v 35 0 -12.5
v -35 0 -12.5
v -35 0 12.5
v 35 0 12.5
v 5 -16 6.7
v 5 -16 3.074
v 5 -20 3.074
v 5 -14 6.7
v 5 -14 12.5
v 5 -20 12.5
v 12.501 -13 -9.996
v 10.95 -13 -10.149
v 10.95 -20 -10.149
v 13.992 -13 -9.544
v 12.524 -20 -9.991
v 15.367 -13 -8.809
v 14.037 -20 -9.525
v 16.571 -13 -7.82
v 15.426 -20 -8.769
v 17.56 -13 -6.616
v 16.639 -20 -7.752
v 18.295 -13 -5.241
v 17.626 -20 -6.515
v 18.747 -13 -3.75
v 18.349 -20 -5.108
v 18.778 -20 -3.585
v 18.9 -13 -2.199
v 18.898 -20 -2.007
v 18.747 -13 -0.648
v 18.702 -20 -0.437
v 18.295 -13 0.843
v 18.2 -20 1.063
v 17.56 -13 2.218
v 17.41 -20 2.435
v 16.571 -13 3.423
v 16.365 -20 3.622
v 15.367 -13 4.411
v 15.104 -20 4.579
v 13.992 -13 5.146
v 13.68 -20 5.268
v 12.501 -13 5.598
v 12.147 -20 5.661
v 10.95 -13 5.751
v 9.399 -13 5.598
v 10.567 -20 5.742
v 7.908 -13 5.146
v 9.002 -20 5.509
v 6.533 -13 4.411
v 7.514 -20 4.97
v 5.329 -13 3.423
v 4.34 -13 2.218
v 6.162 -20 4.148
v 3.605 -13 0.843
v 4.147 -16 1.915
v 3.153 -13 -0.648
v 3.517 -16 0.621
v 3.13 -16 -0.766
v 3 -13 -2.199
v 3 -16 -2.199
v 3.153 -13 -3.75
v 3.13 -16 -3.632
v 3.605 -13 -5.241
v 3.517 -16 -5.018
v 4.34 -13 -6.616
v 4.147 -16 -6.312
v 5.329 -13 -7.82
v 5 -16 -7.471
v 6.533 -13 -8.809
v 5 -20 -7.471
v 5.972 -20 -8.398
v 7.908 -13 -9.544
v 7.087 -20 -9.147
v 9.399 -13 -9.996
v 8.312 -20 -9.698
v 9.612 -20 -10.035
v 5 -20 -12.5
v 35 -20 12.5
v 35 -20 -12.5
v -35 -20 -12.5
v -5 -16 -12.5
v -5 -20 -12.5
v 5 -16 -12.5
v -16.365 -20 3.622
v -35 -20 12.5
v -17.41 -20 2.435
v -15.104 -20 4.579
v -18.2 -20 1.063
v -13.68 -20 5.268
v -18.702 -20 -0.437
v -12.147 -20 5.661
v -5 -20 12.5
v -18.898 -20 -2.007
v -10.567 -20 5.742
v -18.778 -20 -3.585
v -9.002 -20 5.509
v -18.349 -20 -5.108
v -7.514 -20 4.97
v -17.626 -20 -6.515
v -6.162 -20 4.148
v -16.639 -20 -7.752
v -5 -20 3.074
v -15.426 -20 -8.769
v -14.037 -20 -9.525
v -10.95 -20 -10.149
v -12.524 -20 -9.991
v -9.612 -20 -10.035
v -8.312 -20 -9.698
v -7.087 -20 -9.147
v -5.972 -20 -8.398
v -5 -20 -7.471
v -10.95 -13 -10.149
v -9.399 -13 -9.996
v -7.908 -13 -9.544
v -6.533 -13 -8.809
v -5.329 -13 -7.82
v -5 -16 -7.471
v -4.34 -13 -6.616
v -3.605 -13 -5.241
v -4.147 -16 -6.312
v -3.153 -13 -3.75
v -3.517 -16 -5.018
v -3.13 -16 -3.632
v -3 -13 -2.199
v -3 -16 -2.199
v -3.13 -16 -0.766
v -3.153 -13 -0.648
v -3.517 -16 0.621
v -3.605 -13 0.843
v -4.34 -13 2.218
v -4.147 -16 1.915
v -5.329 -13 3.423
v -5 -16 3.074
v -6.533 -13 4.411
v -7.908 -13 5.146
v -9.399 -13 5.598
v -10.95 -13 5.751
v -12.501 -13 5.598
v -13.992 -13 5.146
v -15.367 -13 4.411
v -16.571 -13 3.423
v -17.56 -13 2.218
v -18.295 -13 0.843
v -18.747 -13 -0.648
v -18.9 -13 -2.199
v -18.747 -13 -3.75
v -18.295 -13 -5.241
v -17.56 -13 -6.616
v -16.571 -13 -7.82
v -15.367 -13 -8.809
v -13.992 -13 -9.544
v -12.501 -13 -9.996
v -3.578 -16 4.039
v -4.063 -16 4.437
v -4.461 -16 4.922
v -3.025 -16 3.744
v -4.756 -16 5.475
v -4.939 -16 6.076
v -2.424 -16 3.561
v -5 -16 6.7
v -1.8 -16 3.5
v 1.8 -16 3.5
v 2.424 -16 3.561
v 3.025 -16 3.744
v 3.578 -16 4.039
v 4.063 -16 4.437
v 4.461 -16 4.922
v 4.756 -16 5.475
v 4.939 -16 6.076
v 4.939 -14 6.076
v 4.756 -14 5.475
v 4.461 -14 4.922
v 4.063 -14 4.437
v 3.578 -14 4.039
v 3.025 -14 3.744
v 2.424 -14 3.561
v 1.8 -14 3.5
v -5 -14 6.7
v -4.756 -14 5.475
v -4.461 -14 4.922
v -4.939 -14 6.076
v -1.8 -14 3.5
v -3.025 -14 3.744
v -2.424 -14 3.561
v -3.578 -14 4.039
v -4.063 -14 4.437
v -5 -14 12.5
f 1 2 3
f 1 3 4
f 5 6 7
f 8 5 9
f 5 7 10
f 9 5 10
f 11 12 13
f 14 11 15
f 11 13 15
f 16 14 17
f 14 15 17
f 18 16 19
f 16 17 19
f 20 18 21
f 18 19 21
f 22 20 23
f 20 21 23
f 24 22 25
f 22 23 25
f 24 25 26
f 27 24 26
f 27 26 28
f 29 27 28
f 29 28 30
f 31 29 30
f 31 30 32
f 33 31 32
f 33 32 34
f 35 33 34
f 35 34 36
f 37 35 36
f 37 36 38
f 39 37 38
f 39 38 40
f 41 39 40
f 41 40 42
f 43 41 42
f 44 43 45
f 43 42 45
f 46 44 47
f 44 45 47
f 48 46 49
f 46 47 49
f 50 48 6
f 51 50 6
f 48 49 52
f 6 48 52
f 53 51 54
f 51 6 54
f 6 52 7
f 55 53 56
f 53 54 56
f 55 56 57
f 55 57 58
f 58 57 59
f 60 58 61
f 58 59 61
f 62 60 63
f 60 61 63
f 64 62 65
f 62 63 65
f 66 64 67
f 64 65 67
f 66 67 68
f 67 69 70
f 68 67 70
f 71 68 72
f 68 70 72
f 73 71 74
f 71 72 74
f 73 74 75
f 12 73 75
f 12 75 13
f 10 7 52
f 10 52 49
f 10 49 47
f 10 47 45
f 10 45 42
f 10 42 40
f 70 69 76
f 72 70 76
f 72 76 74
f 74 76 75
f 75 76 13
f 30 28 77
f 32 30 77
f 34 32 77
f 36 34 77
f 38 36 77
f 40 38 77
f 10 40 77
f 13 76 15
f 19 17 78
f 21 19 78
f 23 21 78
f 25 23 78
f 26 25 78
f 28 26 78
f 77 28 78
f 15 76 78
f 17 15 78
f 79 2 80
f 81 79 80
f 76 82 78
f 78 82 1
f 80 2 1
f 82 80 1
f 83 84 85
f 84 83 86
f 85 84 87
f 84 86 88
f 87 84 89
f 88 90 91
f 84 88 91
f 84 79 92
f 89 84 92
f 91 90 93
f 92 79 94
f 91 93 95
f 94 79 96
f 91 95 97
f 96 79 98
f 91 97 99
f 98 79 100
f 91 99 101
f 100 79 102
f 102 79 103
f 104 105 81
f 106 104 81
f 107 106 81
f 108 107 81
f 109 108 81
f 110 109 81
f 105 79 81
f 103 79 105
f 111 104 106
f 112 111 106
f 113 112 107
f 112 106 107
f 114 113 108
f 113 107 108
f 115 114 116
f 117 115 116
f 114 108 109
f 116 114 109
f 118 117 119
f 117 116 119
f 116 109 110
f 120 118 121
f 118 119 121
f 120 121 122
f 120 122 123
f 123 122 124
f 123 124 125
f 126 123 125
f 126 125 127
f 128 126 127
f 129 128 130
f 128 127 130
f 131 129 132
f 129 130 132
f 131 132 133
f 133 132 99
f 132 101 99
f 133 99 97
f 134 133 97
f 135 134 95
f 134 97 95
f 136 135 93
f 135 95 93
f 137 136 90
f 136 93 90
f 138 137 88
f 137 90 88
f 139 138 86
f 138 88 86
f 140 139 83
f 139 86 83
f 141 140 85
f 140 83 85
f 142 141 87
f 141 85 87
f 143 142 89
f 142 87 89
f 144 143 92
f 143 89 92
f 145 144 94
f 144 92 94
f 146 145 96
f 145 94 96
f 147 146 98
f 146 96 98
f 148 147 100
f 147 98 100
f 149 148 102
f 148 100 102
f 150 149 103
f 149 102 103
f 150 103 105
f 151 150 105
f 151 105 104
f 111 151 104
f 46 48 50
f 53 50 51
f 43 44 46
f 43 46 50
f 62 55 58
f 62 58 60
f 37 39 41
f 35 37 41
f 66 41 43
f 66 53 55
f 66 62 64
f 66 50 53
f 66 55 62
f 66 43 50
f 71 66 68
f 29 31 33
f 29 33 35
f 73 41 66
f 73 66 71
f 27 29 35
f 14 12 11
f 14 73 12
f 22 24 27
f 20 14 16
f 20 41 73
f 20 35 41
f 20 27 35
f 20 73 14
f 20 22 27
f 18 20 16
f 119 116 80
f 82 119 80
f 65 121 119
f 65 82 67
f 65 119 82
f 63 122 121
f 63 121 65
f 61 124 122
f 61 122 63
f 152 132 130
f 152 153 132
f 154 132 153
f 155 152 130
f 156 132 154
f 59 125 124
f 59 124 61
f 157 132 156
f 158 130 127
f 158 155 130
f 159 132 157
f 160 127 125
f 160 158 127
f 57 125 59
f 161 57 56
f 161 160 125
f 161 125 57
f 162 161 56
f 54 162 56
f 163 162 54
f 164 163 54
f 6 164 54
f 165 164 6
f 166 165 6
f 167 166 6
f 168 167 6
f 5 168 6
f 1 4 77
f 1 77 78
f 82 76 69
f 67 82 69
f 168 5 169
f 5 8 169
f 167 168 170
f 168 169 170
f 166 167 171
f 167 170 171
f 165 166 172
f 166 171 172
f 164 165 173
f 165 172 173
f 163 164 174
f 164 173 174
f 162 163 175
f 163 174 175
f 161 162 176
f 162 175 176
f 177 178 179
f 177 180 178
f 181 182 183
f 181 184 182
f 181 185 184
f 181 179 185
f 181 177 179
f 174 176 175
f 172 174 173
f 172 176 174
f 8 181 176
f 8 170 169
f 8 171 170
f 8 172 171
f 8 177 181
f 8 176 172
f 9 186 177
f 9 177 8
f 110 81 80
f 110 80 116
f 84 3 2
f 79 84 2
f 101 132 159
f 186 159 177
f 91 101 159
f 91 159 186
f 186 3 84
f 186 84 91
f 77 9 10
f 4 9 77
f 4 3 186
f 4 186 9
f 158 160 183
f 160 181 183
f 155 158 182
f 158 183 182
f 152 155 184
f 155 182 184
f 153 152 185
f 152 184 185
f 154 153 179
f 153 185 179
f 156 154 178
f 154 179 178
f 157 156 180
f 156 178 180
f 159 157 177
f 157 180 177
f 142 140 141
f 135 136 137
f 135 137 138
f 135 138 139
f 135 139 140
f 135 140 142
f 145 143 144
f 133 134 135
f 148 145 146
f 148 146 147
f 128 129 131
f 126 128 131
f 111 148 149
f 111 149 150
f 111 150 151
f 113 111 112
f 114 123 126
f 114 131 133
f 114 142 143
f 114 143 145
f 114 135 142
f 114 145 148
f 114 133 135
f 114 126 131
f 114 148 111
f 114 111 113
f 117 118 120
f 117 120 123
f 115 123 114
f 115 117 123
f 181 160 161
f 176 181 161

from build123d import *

# Parameters (mm, degrees)
SKETCH1_W           = 70
SKETCH1_H           = 25
BOSS_EXTRUDE1_DEPTH = 20
SKETCH2_R           = 7.95
CUT_EXTRUDE1_DEPTH  = 7
SKETCH3_W           = 10
SKETCH3_H           = 25
CUT_EXTRUDE2_DEPTH  = 4
SKETCH7_W           = 10
SKETCH7_H           = 9
CUT_EXTRUDE3_DEPTH  = 6
FILLET1_R           = 3.2


with BuildPart() as part:
    # Sketch1 → Boss-Extrude1 (new body)
    with BuildSketch(Plane(origin=(0, 0, 0), x_dir=(1, 0, 0), z_dir=(0, 1, 0))):
        Rectangle(SKETCH1_W, SKETCH1_H)
    extrude(amount=-BOSS_EXTRUDE1_DEPTH)

    # Sketch2 → Cut-Extrude1 (cut)
    with BuildSketch(Plane.XZ.offset(20)):
        with Locations(Location((-10.95, -2.198838129, 0), (0, 0, 270))):
            Circle(SKETCH2_R)
        with Locations(Location((10.95, -2.198838129, 0), (0, 0, 270))):
            Circle(SKETCH2_R)
    extrude(amount=-CUT_EXTRUDE1_DEPTH, mode=Mode.SUBTRACT)

    # Sketch3 → Cut-Extrude2 (cut)
    with BuildSketch(Plane.XZ.offset(20)):
        Rectangle(SKETCH3_W, SKETCH3_H)
    extrude(amount=-CUT_EXTRUDE2_DEPTH, mode=Mode.SUBTRACT)

    # Sketch7 → Cut-Extrude3 (cut)
    with BuildSketch(Plane.XZ.offset(20)):
        with Locations((0, 8)):
            Rectangle(SKETCH7_W, SKETCH7_H)
    extrude(amount=-CUT_EXTRUDE3_DEPTH, mode=Mode.SUBTRACT)

    # Fillet1
    fillet1_edges = [part.edges().sort_by_distance(p)[0] for p in [
        (5, -15, 3.5),
        (-5, -15, 3.5),
    ]]
    fillet(fillet1_edges, radius=FILLET1_R)


solid = part.part
